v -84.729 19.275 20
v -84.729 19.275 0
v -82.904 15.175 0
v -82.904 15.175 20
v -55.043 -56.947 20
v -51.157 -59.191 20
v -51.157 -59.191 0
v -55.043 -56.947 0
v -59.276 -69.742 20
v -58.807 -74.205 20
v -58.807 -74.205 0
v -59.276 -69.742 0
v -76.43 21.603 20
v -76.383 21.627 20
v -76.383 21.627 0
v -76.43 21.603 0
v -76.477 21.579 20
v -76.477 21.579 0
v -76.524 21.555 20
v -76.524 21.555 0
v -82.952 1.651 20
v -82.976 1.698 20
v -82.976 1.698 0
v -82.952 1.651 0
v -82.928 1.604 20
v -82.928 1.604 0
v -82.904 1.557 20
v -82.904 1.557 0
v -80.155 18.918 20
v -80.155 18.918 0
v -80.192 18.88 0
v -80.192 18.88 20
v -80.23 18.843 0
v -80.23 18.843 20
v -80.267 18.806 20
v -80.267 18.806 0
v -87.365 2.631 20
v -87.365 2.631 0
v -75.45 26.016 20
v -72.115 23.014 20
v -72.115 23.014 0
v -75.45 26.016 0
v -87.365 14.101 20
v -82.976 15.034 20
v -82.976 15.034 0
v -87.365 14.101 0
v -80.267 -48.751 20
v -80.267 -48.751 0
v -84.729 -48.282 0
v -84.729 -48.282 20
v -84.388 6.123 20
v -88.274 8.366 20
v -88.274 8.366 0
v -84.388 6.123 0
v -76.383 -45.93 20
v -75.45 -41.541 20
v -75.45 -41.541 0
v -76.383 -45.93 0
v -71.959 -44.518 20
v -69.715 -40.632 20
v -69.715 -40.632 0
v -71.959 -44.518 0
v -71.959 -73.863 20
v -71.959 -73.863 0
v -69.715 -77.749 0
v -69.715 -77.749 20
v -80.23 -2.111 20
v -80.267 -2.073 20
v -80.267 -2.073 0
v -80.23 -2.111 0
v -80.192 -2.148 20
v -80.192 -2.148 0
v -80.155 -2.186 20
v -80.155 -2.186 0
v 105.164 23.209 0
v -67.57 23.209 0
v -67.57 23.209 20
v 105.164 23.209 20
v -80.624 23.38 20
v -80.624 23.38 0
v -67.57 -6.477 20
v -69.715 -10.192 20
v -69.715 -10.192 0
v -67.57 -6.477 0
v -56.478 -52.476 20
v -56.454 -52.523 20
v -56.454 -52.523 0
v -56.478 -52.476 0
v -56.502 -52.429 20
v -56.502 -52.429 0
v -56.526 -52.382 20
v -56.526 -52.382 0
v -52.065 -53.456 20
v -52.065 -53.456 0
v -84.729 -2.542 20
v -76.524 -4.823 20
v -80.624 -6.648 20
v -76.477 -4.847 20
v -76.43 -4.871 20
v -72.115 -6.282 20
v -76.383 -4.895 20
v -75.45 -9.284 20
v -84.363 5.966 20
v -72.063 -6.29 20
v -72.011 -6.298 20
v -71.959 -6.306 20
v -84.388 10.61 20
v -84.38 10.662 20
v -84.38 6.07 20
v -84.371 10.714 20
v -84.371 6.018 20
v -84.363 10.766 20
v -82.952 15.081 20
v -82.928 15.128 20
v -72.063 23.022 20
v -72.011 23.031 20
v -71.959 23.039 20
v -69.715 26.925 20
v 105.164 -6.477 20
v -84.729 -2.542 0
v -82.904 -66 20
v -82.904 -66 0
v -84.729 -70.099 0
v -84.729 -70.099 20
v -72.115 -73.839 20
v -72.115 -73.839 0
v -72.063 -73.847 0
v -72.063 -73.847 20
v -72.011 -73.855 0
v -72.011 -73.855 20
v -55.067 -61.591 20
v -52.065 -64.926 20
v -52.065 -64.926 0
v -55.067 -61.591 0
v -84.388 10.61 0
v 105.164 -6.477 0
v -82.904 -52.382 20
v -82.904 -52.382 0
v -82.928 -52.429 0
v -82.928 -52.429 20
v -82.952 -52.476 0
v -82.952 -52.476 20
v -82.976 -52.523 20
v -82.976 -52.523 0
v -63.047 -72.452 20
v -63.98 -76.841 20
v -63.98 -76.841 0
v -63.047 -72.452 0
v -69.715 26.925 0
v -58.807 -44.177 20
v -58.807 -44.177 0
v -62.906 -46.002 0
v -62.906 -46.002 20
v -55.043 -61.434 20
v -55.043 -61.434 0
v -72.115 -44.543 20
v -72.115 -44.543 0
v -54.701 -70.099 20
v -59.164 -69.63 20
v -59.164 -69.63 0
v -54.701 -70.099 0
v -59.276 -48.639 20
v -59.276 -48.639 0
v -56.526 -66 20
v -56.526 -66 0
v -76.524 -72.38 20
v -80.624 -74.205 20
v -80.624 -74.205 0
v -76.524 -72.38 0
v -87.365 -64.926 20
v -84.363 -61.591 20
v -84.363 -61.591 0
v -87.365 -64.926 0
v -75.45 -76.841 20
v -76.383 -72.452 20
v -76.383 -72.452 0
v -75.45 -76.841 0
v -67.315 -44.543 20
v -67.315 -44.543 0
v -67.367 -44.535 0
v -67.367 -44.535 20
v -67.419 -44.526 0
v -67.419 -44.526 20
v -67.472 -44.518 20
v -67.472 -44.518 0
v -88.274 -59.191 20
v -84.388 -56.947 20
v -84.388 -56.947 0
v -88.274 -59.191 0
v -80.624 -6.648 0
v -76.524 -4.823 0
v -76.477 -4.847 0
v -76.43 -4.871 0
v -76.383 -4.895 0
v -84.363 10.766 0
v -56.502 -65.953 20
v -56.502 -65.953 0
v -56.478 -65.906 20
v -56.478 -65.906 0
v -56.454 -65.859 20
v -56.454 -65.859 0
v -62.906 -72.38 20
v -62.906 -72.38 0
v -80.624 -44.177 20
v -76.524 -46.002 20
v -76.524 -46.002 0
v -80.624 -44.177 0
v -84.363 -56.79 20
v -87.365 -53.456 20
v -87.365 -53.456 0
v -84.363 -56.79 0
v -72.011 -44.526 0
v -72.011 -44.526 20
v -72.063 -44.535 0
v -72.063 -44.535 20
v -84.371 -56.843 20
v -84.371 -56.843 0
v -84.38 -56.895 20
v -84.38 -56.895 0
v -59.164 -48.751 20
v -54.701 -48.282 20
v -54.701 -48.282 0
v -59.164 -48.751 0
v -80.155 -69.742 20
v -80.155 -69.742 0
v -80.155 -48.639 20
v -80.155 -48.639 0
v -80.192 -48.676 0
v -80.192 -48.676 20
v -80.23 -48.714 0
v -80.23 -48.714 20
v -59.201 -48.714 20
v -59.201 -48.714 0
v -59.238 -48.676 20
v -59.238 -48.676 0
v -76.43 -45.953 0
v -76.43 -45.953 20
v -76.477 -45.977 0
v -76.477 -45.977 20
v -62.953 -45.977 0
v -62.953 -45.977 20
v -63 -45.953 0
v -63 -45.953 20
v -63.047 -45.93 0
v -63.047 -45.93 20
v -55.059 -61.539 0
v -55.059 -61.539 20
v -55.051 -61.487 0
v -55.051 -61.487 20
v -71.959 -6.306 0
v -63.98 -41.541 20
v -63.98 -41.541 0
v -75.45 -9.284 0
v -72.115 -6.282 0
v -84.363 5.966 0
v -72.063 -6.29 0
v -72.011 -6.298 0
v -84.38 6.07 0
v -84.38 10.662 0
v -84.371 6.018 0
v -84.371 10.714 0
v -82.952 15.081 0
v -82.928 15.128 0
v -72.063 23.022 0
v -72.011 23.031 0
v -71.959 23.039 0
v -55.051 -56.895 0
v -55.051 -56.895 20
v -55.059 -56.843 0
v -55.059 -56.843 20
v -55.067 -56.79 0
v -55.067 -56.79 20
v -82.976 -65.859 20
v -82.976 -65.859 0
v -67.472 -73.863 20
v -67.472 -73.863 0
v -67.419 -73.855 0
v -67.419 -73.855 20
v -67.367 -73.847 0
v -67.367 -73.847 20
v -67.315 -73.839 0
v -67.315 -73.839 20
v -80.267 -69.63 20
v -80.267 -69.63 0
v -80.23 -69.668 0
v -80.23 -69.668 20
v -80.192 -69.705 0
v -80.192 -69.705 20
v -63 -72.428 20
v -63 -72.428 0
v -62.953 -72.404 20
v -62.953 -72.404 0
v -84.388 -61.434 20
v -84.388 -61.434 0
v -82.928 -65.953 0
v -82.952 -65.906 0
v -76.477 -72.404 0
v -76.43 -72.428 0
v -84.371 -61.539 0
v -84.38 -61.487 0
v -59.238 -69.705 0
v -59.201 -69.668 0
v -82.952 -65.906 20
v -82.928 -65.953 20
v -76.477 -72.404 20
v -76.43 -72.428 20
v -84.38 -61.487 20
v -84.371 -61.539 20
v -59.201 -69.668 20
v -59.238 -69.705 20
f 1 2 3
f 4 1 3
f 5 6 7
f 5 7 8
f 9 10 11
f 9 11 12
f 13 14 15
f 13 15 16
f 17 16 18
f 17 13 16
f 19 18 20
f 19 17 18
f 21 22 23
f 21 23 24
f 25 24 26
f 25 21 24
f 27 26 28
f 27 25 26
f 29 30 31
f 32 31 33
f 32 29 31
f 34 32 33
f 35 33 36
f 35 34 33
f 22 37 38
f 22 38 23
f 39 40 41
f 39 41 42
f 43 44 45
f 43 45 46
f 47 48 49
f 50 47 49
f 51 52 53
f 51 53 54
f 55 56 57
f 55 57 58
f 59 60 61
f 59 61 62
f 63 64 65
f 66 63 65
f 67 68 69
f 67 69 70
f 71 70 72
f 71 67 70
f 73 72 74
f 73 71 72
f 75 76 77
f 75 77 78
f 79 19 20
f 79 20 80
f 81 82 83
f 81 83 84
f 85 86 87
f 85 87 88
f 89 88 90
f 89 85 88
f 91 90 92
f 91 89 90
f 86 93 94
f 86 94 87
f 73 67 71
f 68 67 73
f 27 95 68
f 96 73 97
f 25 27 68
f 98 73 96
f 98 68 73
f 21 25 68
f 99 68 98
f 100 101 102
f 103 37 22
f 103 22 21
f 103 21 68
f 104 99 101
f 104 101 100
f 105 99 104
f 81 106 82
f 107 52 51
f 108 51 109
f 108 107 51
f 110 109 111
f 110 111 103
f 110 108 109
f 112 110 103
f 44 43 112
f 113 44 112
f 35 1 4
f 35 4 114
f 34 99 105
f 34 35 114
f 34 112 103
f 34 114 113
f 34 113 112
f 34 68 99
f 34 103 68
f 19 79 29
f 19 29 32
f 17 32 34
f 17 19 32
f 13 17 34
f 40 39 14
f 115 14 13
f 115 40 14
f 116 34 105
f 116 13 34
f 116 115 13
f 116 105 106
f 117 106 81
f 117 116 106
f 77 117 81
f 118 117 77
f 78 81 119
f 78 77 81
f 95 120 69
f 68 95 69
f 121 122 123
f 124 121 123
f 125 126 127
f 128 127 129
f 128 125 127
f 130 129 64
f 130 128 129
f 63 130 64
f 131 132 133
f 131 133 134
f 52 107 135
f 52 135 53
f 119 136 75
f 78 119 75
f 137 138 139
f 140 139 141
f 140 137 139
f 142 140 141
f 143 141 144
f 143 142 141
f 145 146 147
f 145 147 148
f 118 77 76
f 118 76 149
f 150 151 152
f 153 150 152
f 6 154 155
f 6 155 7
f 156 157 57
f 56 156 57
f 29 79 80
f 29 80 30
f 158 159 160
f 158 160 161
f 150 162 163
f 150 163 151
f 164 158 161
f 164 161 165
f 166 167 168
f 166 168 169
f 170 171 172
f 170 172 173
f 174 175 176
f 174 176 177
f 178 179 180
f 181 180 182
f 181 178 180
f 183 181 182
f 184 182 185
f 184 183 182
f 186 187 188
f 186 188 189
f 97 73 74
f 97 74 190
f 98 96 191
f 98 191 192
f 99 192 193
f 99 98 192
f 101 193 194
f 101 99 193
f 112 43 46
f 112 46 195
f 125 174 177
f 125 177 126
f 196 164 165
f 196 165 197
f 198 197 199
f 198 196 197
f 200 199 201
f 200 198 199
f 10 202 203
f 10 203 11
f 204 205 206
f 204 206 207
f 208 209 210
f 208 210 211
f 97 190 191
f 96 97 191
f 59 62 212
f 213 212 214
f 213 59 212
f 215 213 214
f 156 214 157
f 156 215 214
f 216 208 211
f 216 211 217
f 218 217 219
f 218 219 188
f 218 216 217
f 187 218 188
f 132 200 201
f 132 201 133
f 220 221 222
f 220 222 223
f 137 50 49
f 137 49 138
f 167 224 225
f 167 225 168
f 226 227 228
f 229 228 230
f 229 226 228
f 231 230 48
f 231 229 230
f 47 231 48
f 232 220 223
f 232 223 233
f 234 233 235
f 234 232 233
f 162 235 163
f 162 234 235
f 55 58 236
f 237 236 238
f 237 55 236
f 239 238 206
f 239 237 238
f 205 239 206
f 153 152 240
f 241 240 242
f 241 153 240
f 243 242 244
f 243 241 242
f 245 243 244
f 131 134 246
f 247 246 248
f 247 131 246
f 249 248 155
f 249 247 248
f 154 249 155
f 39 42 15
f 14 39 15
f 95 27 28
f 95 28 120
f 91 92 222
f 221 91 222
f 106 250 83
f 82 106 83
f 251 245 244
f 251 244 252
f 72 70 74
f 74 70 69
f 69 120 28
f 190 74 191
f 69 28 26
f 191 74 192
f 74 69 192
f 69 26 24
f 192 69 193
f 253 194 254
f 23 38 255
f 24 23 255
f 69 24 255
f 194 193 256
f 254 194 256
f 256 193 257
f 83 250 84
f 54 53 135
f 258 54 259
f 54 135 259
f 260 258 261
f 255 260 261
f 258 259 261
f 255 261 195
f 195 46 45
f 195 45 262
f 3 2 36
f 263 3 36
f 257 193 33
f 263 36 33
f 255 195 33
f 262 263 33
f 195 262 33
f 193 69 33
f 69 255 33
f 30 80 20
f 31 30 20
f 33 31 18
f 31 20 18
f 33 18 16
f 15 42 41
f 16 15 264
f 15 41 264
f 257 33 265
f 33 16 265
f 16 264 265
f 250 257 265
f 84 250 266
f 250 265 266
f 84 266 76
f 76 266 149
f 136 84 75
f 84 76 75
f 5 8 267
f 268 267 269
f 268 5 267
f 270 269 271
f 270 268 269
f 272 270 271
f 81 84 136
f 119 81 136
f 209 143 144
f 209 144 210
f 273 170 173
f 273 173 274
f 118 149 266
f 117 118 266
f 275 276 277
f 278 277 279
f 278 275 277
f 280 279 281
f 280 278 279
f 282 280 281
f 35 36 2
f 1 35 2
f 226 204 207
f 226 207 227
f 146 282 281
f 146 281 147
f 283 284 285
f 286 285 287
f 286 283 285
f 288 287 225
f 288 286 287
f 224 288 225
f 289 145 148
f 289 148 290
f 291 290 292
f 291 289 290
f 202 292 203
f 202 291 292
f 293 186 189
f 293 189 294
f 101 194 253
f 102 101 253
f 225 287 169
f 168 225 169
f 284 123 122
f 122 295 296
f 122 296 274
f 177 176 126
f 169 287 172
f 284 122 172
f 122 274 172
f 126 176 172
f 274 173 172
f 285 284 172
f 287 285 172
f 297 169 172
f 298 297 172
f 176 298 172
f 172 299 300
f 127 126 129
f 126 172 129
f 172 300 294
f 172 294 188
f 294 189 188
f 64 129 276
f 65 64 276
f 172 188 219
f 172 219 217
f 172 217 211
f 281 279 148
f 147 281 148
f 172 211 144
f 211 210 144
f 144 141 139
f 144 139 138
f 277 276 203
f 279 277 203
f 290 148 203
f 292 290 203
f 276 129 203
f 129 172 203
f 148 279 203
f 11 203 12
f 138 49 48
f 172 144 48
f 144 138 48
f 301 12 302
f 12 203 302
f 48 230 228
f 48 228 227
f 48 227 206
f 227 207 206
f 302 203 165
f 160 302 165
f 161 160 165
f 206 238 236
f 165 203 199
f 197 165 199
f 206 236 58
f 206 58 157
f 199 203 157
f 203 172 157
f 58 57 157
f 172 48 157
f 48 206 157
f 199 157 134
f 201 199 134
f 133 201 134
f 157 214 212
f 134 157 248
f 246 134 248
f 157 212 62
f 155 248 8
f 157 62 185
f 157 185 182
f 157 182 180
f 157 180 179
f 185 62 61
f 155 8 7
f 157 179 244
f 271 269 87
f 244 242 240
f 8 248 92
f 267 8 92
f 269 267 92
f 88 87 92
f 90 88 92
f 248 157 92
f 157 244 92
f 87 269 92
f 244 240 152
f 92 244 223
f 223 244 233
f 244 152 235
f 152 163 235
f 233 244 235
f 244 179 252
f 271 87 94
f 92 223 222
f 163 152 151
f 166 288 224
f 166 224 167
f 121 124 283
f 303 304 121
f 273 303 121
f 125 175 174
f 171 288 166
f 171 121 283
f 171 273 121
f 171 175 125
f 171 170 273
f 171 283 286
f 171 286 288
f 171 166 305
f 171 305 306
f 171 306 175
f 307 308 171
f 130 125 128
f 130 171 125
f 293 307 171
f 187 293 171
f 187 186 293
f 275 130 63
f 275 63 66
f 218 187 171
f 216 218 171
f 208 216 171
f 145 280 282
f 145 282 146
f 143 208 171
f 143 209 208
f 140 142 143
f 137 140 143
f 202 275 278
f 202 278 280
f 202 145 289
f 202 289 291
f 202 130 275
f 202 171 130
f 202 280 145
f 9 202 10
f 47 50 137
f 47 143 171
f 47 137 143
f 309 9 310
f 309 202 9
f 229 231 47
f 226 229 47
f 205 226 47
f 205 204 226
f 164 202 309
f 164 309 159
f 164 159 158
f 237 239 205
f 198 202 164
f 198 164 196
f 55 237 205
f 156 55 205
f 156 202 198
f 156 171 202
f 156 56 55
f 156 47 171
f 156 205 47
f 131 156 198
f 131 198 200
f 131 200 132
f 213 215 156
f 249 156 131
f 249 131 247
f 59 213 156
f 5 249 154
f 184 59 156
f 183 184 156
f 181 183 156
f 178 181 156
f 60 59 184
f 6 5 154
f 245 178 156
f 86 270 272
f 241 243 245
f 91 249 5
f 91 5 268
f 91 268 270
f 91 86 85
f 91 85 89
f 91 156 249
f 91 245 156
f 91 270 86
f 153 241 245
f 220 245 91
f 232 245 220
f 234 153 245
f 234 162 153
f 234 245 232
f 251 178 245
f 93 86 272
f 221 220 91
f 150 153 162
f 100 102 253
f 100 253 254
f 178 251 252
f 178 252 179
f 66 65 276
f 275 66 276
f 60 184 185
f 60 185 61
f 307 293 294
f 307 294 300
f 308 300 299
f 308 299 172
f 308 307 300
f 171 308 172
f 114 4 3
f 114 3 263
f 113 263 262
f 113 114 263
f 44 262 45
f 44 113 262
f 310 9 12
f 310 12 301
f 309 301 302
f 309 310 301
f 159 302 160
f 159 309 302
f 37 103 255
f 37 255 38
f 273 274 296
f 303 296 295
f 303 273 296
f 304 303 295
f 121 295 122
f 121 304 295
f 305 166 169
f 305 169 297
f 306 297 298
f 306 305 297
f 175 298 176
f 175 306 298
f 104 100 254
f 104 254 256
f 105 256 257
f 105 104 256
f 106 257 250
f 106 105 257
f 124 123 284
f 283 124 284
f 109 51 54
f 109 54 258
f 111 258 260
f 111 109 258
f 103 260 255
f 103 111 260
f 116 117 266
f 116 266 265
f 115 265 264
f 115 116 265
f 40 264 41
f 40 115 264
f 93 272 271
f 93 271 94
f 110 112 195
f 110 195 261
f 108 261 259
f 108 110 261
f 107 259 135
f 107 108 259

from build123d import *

# Parameters (mm, degrees)
IZIM1_W                     = 174.879
IZIM1_H                     = 29.68625
Y_KSEKLIK_EKSTR_ZYON1_DEPTH = 20
IZIM2_R                     = 14.843125
Y_KSEKLIK_EKSTR_ZYON5_DEPTH = 20


with BuildPart() as part:
    # Çizim1 → Yükseklik-Ekstrüzyon1 (new body)
    with BuildSketch(Plane.XY):
        with Locations((17.724325704, 8.366125)):
            Rectangle(IZIM1_W, IZIM1_H)
    extrude(amount=Y_KSEKLIK_EKSTR_ZYON1_DEPTH)

    # Çizim2 → Yükseklik-Ekstrüzyon5 (add, through all)
    with BuildSketch(Plane.XY.offset(20)):
        with Locations((-69.715174296, -59.190786916)):
            Circle(IZIM2_R)
        with BuildLine():
            Line((-75.450089767, -76.841041848), (-72.115481735, -73.83854729))
            ThreePointArc((-72.115481735, -73.83854729), (-74.30195217, -73.30743767), (-76.383022313, -72.451939302))
            Line((-76.383022313, -72.451939302), (-75.450089767, -76.841041848))
        make_face()
        with BuildLine():
            ThreePointArc((-67.471595442, -73.863370659), (-69.715174296, -74.033911916), (-71.95875315, -73.863370659))
            Line((-71.95875315, -73.863370659), (-69.715174296, -77.749363225))
            Line((-69.715174296, -77.749363225), (-67.471595442, -73.863370659))
        make_face()
        with BuildLine():
            ThreePointArc((-63.047326279, -72.451939302), (-65.128396421, -73.30743767), (-67.314866857, -73.83854729))
            Line((-67.314866857, -73.83854729), (-63.980258825, -76.841041848))
            Line((-63.980258825, -76.841041848), (-63.047326279, -72.451939302))
        make_face()
        with BuildLine():
            ThreePointArc((-59.275752538, -69.742413953), (-60.990604323, -71.199127291), (-62.90593938, -72.379899078))
            Line((-62.90593938, -72.379899078), (-58.806716838, -74.204990541))
            Line((-58.806716838, -74.204990541), (-59.275752538, -69.742413953))
        make_face()
        with BuildLine():
            ThreePointArc((-56.526062134, -66.000021832), (-57.706833921, -67.915356889), (-59.163547259, -69.630208674))
            Line((-59.163547259, -69.630208674), (-54.700970671, -70.099244374))
            Line((-54.700970671, -70.099244374), (-56.526062134, -66.000021832))
        make_face()
        with BuildLine():
            ThreePointArc((-55.067413922, -61.591094355), (-55.598523542, -63.777564791), (-56.45402191, -65.858634933))
            Line((-56.45402191, -65.858634933), (-52.064919364, -64.925702387))
            Line((-52.064919364, -64.925702387), (-55.067413922, -61.591094355))
        make_face()
        with BuildLine():
            ThreePointArc((-54.872049296, -59.190786916), (-54.914746019, -60.315812515), (-55.042590553, -61.43436577))
            Line((-55.042590553, -61.43436577), (-51.156597987, -59.190786916))
            Line((-51.156597987, -59.190786916), (-55.042590553, -56.947208062))
            ThreePointArc((-55.042590553, -56.947208062), (-54.914746019, -58.065761317), (-54.872049296, -59.190786916))
        make_face()
        with BuildLine():
            ThreePointArc((-56.45402191, -52.522938899), (-55.598523542, -54.604009042), (-55.067413922, -56.790479477))
            Line((-55.067413922, -56.790479477), (-52.064919364, -53.455871445))
            Line((-52.064919364, -53.455871445), (-56.45402191, -52.522938899))
        make_face()
        with BuildLine():
            ThreePointArc((-59.163547259, -48.751365158), (-57.706833921, -50.466216943), (-56.526062134, -52.381552))
            Line((-56.526062134, -52.381552), (-54.700970671, -48.282329458))
            Line((-54.700970671, -48.282329458), (-59.163547259, -48.751365158))
        make_face()
        with BuildLine():
            ThreePointArc((-62.90593938, -46.001674754), (-60.990604323, -47.182446542), (-59.275752538, -48.63915988))
            Line((-59.275752538, -48.639159879), (-58.806716838, -44.176583291))
            Line((-58.806716838, -44.176583291), (-62.90593938, -46.001674754))
        make_face()
        with BuildLine():
            Line((-63.980258825, -41.540531985), (-67.314866857, -44.543026543))
            ThreePointArc((-67.314866857, -44.543026543), (-65.128396421, -45.074136163), (-63.047326279, -45.929634531))
            Line((-63.047326279, -45.929634531), (-63.980258825, -41.540531985))
        make_face()
        with BuildLine():
            Line((-69.715174296, -40.632210608), (-71.95875315, -44.518203173))
            ThreePointArc((-71.95875315, -44.518203173), (-69.715174296, -44.347661916), (-67.471595442, -44.518203173))
            Line((-67.471595442, -44.518203173), (-69.715174296, -40.632210608))
        make_face()
        with BuildLine():
            Line((-75.450089767, -41.540531985), (-76.383022313, -45.929634531))
            ThreePointArc((-76.383022313, -45.929634531), (-74.30195217, -45.074136163), (-72.115481735, -44.543026543))
            Line((-72.115481735, -44.543026543), (-75.450089767, -41.540531985))
        make_face()
        with BuildLine():
            Line((-80.623631754, -44.176583291), (-80.154596054, -48.639159879))
            ThreePointArc((-80.154596054, -48.639159879), (-78.439744269, -47.182446542), (-76.524409212, -46.001674754))
            Line((-76.524409212, -46.001674754), (-80.623631754, -44.176583291))
        make_face()
        with BuildLine():
            Line((-84.729377921, -48.282329458), (-82.904286458, -52.381552))
            ThreePointArc((-82.904286458, -52.381552), (-81.72351467, -50.466216943), (-80.266801332, -48.751365158))
            Line((-80.266801332, -48.751365158), (-84.729377921, -48.282329458))
        make_face()
        with BuildLine():
            Line((-87.365429227, -53.455871445), (-84.362934669, -56.790479477))
            ThreePointArc((-84.362934669, -56.790479477), (-83.831825049, -54.604009042), (-82.976326681, -52.522938899))
            Line((-82.976326681, -52.522938899), (-87.365429227, -53.455871445))
        make_face()
        with BuildLine():
            Line((-88.273750604, -59.190786916), (-84.387758039, -61.43436577))
            ThreePointArc((-84.387758039, -61.43436577), (-84.558299296, -59.190786916), (-84.387758039, -56.947208062))
            Line((-84.387758039, -56.947208062), (-88.273750604, -59.190786916))
        make_face()
        with BuildLine():
            Line((-87.365429227, -64.925702387), (-82.976326681, -65.858634933))
            ThreePointArc((-82.976326681, -65.858634933), (-83.831825049, -63.777564791), (-84.362934669, -61.591094355))
            Line((-84.362934669, -61.591094355), (-87.365429227, -64.925702387))
        make_face()
        with BuildLine():
            Line((-84.729377921, -70.099244374), (-80.266801332, -69.630208674))
            ThreePointArc((-80.266801332, -69.630208674), (-81.72351467, -67.915356889), (-82.904286458, -66.000021832))
            Line((-82.904286458, -66.000021832), (-84.729377921, -70.099244374))
        make_face()
        with BuildLine():
            Line((-80.623631754, -74.204990541), (-76.524409212, -72.379899078))
            ThreePointArc((-76.524409212, -72.379899078), (-78.439744269, -71.199127291), (-80.154596054, -69.742413953))
            Line((-80.154596054, -69.742413953), (-80.623631754, -74.204990541))
        make_face()
        with BuildLine():
            Line((-69.715174296, -6.477), (-69.715174296, 23.20925))
            ThreePointArc((-69.715174296, 23.20925), (-70.840199895, 23.166553276), (-71.95875315, 23.038708743))
            ThreePointArc((-71.95875315, 23.038708743), (-72.037150615, 23.0265065), (-72.115481735, 23.013885374))
            ThreePointArc((-72.115481735, 23.013885374), (-74.30195217, 22.482775753), (-76.383022313, 21.627277385))
            ThreePointArc((-76.383022313, 21.627277385), (-76.453812032, 21.591446214), (-76.524409212, 21.555237162))
            ThreePointArc((-76.524409212, 21.555237162), (-78.439744269, 20.374465375), (-80.154596054, 18.917752037))
            ThreePointArc((-80.154596054, 18.917752037), (-80.210848637, 18.861799341), (-80.266801332, 18.805546758))
            ThreePointArc((-80.266801332, 18.805546758), (-81.72351467, 17.090694973), (-82.904286458, 15.175359916))
            ThreePointArc((-82.904286458, 15.175359916), (-82.94049551, 15.104762736), (-82.976326681, 15.033973017))
            ThreePointArc((-82.976326681, 15.033973017), (-83.831825049, 12.952902875), (-84.362934669, 10.766432439))
            ThreePointArc((-84.362934669, 10.766432439), (-84.375555796, 10.688101319), (-84.387758039, 10.609703854))
            ThreePointArc((-84.387758039, 10.609703854), (-84.558299296, 8.366125), (-84.387758039, 6.122546146))
            ThreePointArc((-84.387758039, 6.122546146), (-84.375555796, 6.044148681), (-84.362934669, 5.965817561))
            ThreePointArc((-84.362934669, 5.965817561), (-83.831825049, 3.779347125), (-82.976326681, 1.698276983))
            ThreePointArc((-82.976326681, 1.698276983), (-82.94049551, 1.627487264), (-82.904286458, 1.556890084))
            ThreePointArc((-82.904286458, 1.556890084), (-81.72351467, -0.358444973), (-80.266801332, -2.073296758))
            ThreePointArc((-80.266801332, -2.073296758), (-80.210848637, -2.129549342), (-80.154596054, -2.185502037))
            ThreePointArc((-80.154596054, -2.185502037), (-78.439744269, -3.642215375), (-76.524409212, -4.822987162))
            ThreePointArc((-76.524409212, -4.822987162), (-76.453812032, -4.859196214), (-76.383022313, -4.895027385))
            ThreePointArc((-76.383022313, -4.895027385), (-74.30195217, -5.750525753), (-72.115481735, -6.281635374))
            ThreePointArc((-72.115481735, -6.281635374), (-72.037150615, -6.2942565), (-71.95875315, -6.306458743))
            ThreePointArc((-71.95875315, -6.306458743), (-70.840199895, -6.434303276), (-69.715174296, -6.477))
        make_face()
        with BuildLine():
            Line((-75.450089767, -9.284129931), (-72.115481735, -6.281635374))
            ThreePointArc((-72.115481735, -6.281635374), (-74.30195217, -5.750525753), (-76.383022313, -4.895027385))
            Line((-76.383022313, -4.895027385), (-75.450089767, -9.284129931))
        make_face()
        with BuildLine():
            Line((-67.570057483, -6.477), (-69.715174296, -6.477))
            ThreePointArc((-69.715174296, -6.477), (-70.840199895, -6.434303276), (-71.95875315, -6.306458743))
            Line((-71.95875315, -6.306458743), (-69.715174296, -10.192451309))
            Line((-69.715174296, -10.192451309), (-67.570057483, -6.477))
        make_face()
        with BuildLine():
            Line((-80.623631754, -6.648078625), (-76.524409212, -4.822987162))
            ThreePointArc((-76.524409212, -4.822987162), (-78.439744269, -3.642215375), (-80.154596054, -2.185502037))
            Line((-80.154596054, -2.185502037), (-80.623631754, -6.648078625))
        make_face()
        with BuildLine():
            Line((-84.729377921, -2.542332458), (-80.266801332, -2.073296758))
            ThreePointArc((-80.266801332, -2.073296758), (-81.72351467, -0.358444973), (-82.904286458, 1.556890084))
            Line((-82.904286458, 1.556890084), (-84.729377921, -2.542332458))
        make_face()
        with BuildLine():
            Line((-87.365429227, 2.631209529), (-82.976326681, 1.698276983))
            ThreePointArc((-82.976326681, 1.698276983), (-83.831825049, 3.779347125), (-84.362934669, 5.965817561))
            Line((-84.362934669, 5.965817561), (-87.365429227, 2.631209529))
        make_face()
        with BuildLine():
            ThreePointArc((-84.387758039, 6.122546146), (-84.558299296, 8.366125), (-84.387758039, 10.609703854))
            Line((-84.387758039, 10.609703854), (-88.273750604, 8.366125))
            Line((-88.273750604, 8.366125), (-84.387758039, 6.122546146))
        make_face()
        with BuildLine():
            ThreePointArc((-84.362934669, 10.766432439), (-83.831825049, 12.952902875), (-82.976326681, 15.033973017))
            Line((-82.976326681, 15.033973017), (-87.365429227, 14.101040471))
            Line((-87.365429227, 14.101040471), (-84.362934669, 10.766432439))
        make_face()
        with BuildLine():
            ThreePointArc((-82.904286458, 15.175359916), (-81.72351467, 17.090694973), (-80.266801332, 18.805546758))
            Line((-80.266801332, 18.805546758), (-84.729377921, 19.274582458))
            Line((-84.729377921, 19.274582458), (-82.904286458, 15.175359916))
        make_face()
        with BuildLine():
            ThreePointArc((-80.154596054, 18.917752037), (-78.439744269, 20.374465375), (-76.524409212, 21.555237162))
            Line((-76.524409212, 21.555237162), (-80.623631754, 23.380328625))
            Line((-80.623631754, 23.380328625), (-80.154596054, 18.917752037))
        make_face()
        with BuildLine():
            ThreePointArc((-76.383022313, 21.627277385), (-74.30195217, 22.482775753), (-72.115481735, 23.013885374))
            Line((-72.115481735, 23.013885374), (-75.450089767, 26.016379931))
            Line((-75.450089767, 26.016379931), (-76.383022313, 21.627277385))
        make_face()
        with BuildLine():
            Line((-69.715174296, 23.20925), (-67.570057483, 23.20925))
            Line((-67.570057483, 23.20925), (-69.715174296, 26.924701309))
            Line((-69.715174296, 26.924701309), (-71.95875315, 23.038708743))
            ThreePointArc((-71.95875315, 23.038708743), (-70.840199895, 23.166553276), (-69.715174296, 23.20925))
        make_face()
    extrude(amount=-Y_KSEKLIK_EKSTR_ZYON5_DEPTH)


with BuildPart() as y_kseklik_ekstr_zyon5_piece_1:
    # of the separate pieces the step leaves, piece 1, a body of its own (y_kseklik_ekstr_zyon5_pieces)
    add(part.part.solids().sort_by_distance((-67.570057483, -6.477, 0))[0])


with BuildPart() as y_kseklik_ekstr_zyon5_piece_2:
    # of the separate pieces the step leaves, piece 2, a body of its own (y_kseklik_ekstr_zyon5_pieces)
    add(part.part.solids().sort_by_distance((-76.383022313, -72.451939302, 20))[0])


solid = Compound([y_kseklik_ekstr_zyon5_piece_1.part, y_kseklik_ekstr_zyon5_piece_2.part])
